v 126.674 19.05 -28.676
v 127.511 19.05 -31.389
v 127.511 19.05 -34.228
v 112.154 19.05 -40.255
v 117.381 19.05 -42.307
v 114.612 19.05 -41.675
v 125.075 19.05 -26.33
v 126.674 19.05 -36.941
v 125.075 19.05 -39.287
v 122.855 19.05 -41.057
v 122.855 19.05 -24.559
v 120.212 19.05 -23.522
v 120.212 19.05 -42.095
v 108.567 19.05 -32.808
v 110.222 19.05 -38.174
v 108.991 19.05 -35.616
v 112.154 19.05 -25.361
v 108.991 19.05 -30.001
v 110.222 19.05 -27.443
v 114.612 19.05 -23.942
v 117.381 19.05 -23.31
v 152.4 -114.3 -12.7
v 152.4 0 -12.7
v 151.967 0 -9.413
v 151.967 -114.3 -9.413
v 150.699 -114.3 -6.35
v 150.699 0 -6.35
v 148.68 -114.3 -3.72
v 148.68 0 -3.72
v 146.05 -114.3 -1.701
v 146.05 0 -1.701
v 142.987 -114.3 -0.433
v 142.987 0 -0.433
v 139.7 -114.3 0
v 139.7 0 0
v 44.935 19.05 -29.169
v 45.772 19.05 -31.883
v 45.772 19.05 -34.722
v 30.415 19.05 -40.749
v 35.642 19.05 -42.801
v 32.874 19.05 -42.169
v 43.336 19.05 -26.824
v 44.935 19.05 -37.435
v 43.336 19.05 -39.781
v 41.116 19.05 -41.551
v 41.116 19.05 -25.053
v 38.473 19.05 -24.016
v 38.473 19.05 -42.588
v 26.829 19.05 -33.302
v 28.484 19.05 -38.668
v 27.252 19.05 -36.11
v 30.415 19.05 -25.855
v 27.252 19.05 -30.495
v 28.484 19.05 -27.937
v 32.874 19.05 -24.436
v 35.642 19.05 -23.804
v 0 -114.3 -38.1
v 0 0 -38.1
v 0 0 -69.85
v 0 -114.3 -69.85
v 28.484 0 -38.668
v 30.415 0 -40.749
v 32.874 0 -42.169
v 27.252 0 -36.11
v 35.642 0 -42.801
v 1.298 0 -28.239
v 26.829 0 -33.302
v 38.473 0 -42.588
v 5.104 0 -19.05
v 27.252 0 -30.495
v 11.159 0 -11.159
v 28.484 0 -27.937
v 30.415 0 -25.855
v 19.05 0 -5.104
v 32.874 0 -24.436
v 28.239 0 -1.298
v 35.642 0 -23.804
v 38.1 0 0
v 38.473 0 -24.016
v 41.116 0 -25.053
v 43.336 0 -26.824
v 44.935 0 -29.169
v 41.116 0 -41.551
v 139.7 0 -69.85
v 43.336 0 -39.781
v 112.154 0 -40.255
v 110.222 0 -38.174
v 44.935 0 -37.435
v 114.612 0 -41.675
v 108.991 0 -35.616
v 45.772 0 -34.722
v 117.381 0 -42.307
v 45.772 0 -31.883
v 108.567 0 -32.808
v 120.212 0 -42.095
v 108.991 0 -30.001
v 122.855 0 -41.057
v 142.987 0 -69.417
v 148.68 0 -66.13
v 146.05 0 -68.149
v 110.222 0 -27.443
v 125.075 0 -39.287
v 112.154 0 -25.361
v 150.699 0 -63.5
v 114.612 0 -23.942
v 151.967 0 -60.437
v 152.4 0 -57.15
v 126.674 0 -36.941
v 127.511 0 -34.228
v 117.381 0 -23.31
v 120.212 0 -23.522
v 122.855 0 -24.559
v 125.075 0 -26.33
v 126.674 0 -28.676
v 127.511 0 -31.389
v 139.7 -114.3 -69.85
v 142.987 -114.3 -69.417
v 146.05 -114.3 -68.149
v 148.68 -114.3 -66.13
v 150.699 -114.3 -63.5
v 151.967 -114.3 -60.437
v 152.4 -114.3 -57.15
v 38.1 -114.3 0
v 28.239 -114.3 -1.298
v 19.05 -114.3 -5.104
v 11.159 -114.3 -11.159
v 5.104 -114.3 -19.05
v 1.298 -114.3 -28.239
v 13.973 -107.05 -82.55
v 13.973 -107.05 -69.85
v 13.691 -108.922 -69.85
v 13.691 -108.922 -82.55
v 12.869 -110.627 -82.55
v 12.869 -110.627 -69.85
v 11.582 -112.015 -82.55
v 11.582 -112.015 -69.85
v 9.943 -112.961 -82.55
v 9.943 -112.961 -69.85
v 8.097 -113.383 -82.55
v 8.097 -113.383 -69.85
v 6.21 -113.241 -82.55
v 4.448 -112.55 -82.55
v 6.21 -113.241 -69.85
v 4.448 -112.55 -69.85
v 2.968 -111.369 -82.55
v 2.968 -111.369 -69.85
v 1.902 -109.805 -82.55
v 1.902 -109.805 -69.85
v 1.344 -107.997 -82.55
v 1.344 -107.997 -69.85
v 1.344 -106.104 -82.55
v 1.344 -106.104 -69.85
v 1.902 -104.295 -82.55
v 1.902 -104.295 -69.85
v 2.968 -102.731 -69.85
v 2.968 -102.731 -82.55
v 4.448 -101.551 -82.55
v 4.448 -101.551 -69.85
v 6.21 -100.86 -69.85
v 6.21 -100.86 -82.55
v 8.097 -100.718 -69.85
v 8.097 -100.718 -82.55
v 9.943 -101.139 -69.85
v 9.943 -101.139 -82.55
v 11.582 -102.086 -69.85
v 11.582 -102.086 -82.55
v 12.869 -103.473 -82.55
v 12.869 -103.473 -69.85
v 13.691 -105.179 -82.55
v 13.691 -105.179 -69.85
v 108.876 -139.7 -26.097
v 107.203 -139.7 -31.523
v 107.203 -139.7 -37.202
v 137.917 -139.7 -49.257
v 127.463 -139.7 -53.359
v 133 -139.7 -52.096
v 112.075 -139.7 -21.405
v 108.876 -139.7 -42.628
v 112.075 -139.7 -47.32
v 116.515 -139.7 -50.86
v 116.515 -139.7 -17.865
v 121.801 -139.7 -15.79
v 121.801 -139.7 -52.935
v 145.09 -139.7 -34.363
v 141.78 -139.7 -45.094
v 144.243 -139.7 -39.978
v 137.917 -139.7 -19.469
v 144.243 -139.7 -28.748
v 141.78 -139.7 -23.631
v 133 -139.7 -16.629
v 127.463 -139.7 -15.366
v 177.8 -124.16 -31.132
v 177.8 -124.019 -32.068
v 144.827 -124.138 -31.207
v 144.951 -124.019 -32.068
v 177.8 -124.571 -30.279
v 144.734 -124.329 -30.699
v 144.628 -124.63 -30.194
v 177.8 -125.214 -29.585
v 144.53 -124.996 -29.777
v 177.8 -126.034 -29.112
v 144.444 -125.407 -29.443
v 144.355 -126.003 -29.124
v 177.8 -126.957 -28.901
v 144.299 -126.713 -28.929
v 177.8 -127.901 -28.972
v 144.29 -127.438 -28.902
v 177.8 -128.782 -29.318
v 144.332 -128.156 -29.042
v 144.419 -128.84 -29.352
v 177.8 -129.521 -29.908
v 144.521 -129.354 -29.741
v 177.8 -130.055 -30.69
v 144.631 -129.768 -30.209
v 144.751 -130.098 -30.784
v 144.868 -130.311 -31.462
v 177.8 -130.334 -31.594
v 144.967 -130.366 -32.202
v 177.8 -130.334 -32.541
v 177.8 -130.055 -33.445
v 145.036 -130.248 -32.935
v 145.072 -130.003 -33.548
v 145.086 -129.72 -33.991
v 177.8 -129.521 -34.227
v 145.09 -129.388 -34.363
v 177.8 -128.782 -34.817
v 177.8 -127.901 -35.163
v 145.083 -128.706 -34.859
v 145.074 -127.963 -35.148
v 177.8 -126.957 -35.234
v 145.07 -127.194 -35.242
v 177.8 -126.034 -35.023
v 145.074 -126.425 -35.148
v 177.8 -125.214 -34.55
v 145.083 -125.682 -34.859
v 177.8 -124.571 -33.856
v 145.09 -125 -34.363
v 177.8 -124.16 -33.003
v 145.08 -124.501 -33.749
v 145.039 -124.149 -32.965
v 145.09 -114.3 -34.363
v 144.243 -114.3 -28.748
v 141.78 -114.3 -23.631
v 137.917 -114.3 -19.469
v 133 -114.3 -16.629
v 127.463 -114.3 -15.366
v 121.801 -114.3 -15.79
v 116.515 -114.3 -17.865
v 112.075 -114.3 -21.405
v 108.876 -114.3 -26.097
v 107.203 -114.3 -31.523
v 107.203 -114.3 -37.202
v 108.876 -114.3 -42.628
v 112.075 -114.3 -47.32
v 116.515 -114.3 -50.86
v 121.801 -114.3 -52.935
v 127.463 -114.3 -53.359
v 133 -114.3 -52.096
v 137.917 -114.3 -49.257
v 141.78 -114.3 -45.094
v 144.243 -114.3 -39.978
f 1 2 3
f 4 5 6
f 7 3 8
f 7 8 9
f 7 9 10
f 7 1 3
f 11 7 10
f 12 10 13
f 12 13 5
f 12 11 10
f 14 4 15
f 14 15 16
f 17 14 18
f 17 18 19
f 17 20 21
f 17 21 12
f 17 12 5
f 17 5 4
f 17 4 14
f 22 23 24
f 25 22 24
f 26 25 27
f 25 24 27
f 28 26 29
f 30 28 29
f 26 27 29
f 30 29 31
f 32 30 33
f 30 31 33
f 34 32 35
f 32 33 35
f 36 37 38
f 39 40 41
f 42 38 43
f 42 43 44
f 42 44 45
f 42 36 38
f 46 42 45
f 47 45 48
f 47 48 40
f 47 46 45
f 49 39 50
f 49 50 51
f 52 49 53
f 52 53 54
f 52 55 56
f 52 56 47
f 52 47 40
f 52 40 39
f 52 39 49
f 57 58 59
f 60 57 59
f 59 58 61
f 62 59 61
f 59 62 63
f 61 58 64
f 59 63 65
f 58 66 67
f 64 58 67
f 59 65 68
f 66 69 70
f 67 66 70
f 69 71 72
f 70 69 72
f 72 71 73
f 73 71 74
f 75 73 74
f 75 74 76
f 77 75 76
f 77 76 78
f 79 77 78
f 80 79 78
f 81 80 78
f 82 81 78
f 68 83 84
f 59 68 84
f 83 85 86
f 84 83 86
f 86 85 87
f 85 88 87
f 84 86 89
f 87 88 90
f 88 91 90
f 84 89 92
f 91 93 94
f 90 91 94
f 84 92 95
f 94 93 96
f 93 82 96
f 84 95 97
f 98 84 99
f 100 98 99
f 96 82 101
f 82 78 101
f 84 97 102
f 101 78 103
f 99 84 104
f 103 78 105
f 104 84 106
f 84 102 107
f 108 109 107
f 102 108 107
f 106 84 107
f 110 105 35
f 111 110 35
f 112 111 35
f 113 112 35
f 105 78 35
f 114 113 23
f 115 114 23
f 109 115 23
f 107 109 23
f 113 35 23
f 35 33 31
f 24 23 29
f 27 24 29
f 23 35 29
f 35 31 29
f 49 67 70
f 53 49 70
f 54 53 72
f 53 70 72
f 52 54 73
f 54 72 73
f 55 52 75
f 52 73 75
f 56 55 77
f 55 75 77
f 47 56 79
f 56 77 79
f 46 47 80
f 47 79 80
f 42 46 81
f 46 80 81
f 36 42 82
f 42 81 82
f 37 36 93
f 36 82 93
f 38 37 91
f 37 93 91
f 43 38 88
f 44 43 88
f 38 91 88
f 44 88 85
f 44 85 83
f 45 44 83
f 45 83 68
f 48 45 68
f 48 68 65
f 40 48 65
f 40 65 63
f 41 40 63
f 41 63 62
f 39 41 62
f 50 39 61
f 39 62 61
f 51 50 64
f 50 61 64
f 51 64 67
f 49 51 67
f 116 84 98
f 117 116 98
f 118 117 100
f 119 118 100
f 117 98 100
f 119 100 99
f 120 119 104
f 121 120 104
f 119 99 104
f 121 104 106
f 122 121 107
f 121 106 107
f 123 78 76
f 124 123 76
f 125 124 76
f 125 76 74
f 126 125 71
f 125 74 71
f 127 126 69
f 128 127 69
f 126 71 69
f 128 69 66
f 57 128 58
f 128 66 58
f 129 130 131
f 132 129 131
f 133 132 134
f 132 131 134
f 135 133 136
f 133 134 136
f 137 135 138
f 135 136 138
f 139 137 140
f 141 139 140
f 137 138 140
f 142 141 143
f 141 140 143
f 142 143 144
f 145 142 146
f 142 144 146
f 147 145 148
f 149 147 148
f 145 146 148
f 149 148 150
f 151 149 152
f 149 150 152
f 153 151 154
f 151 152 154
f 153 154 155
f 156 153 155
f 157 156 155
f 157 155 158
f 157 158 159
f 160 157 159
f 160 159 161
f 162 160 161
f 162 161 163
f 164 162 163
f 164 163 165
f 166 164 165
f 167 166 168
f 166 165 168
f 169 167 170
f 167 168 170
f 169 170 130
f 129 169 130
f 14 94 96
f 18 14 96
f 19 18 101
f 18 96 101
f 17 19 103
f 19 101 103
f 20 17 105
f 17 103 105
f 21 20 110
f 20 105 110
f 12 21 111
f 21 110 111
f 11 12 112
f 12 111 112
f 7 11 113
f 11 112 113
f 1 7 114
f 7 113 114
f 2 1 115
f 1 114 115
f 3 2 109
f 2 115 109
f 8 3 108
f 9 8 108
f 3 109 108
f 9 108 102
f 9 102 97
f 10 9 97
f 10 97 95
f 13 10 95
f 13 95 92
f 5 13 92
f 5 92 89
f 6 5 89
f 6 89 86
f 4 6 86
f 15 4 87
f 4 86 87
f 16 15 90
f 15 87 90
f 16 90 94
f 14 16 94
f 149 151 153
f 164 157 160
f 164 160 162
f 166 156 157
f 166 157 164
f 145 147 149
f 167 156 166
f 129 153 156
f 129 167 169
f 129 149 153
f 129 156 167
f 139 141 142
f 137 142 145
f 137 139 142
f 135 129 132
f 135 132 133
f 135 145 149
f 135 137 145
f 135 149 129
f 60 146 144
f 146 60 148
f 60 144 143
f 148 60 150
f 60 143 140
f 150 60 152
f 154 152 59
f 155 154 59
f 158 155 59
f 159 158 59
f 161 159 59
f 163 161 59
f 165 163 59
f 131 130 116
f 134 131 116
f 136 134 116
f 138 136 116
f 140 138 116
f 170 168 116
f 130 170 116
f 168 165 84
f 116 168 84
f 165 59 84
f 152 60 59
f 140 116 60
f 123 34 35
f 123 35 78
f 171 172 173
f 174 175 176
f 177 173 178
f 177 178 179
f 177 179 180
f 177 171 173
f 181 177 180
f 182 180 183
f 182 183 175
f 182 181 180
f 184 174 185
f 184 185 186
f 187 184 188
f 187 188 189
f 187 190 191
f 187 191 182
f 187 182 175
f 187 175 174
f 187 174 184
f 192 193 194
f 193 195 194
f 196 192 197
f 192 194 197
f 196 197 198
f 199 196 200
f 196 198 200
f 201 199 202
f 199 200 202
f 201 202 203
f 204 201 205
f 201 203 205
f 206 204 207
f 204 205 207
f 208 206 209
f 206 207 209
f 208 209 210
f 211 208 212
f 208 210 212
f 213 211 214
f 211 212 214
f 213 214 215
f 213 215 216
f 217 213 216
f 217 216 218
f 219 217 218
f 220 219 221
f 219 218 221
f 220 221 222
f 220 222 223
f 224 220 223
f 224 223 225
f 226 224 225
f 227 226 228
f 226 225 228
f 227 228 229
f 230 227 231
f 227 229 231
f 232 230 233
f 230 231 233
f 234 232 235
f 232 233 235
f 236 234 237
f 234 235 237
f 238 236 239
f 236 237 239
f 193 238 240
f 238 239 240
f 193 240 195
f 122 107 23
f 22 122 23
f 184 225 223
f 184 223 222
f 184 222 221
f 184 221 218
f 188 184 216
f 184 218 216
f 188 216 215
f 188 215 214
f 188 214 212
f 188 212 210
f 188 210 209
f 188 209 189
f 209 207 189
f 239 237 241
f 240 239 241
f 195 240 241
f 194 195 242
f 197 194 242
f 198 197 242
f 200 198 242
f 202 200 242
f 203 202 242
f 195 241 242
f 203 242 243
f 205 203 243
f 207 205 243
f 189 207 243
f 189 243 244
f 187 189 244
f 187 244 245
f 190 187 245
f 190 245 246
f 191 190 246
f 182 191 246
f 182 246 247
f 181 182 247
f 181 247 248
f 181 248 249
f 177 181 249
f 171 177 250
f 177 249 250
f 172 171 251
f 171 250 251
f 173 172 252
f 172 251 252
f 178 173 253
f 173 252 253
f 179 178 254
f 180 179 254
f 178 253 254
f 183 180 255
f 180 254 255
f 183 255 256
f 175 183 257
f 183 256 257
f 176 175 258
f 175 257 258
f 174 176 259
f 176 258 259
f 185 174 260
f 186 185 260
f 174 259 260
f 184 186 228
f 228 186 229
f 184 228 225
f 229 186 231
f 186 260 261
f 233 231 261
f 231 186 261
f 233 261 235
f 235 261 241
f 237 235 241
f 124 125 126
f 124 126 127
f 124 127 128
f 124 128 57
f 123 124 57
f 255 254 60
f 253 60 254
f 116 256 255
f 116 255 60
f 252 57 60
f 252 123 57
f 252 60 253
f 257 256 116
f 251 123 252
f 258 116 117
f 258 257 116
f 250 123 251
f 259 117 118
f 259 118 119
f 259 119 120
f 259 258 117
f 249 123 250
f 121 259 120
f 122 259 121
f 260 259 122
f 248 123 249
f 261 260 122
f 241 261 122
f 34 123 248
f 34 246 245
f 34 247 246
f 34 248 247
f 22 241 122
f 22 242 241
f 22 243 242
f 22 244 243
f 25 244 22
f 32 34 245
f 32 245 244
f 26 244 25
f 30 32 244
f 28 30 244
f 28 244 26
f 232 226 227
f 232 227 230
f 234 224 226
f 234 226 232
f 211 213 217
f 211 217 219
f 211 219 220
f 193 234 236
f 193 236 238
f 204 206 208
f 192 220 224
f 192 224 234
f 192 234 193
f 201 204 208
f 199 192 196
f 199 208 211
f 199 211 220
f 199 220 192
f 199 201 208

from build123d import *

# Parameters (mm, degrees)
F1_DEPTH  = 114.3
F2_R      = 19.05
F3_DEPTH  = 25.4
F4_R      = 6.35
F5_DEPTH  = 12.7
F6_R      = 3.175
F7_DEPTH  = 12.7
F7_FACE_R = 3.175
F8_DEPTH  = 25.4
F9_R      = 9.525
F10_DEPTH = 19.05


with BuildPart() as f1:
    # F0 (on Front) → F1 (new body)
    with BuildSketch(Plane.XZ):
        with BuildLine():
            Line((139.7, 0), (38.1, 0))
            ThreePointArc((38.1, 0), (11.159232, -11.159232), (0, -38.1))
            Line((0, -38.1), (0, -69.85))
            Line((0, -69.85), (139.7, -69.85))
            ThreePointArc((139.7, -69.85), (148.680256, -66.130256), (152.4, -57.15))
            Line((152.4, -57.15), (152.4, -12.7))
            ThreePointArc((152.4, -12.7), (148.680256, -3.719744), (139.7, 0))
        make_face()
    extrude(amount=F1_DEPTH)

    # F2 (on face) → F3 (join)
    with BuildSketch(Plane.XZ.offset(114.3)):
        with Locations((126.039833, -34.362618)):
            Circle(F2_R)
    extrude(amount=F3_DEPTH)

    # F4 (on face) → F5 (join)
    with BuildSketch(Plane(origin=(0, 0, -69.85), x_dir=(1, 0, 0), z_dir=(0, 0, -1))):
        with Locations((7.622689, 107.050315)):
            Circle(F4_R)
    extrude(amount=F5_DEPTH)

    # F6 (on face) → F7 (join)
    with BuildSketch(Plane.YZ.offset(152.4)):
        with Locations((-127.194032, -32.0675)):
            Circle(F6_R)
    extrude(amount=-F7_DEPTH)

    # F7_face (on face) → F8 (join)
    with BuildSketch(Plane(origin=(152.4, -127.194032, -32.0675), x_dir=(0, 1, 0), z_dir=(1, 0, 0))):
        Circle(F7_FACE_R)
    extrude(amount=F8_DEPTH)

    # F9 (on face) → F10 (join)
    with BuildSketch(Plane(origin=(0, 0, 0), x_dir=(-1, 0, 0), z_dir=(0, 1, 0))):
        with Locations((-118.092358, -32.808334)):
            Circle(F9_R)
        with Locations((-36.353748, -33.302221)):
            Circle(F9_R)
    extrude(amount=F10_DEPTH)


solid = f1.part
